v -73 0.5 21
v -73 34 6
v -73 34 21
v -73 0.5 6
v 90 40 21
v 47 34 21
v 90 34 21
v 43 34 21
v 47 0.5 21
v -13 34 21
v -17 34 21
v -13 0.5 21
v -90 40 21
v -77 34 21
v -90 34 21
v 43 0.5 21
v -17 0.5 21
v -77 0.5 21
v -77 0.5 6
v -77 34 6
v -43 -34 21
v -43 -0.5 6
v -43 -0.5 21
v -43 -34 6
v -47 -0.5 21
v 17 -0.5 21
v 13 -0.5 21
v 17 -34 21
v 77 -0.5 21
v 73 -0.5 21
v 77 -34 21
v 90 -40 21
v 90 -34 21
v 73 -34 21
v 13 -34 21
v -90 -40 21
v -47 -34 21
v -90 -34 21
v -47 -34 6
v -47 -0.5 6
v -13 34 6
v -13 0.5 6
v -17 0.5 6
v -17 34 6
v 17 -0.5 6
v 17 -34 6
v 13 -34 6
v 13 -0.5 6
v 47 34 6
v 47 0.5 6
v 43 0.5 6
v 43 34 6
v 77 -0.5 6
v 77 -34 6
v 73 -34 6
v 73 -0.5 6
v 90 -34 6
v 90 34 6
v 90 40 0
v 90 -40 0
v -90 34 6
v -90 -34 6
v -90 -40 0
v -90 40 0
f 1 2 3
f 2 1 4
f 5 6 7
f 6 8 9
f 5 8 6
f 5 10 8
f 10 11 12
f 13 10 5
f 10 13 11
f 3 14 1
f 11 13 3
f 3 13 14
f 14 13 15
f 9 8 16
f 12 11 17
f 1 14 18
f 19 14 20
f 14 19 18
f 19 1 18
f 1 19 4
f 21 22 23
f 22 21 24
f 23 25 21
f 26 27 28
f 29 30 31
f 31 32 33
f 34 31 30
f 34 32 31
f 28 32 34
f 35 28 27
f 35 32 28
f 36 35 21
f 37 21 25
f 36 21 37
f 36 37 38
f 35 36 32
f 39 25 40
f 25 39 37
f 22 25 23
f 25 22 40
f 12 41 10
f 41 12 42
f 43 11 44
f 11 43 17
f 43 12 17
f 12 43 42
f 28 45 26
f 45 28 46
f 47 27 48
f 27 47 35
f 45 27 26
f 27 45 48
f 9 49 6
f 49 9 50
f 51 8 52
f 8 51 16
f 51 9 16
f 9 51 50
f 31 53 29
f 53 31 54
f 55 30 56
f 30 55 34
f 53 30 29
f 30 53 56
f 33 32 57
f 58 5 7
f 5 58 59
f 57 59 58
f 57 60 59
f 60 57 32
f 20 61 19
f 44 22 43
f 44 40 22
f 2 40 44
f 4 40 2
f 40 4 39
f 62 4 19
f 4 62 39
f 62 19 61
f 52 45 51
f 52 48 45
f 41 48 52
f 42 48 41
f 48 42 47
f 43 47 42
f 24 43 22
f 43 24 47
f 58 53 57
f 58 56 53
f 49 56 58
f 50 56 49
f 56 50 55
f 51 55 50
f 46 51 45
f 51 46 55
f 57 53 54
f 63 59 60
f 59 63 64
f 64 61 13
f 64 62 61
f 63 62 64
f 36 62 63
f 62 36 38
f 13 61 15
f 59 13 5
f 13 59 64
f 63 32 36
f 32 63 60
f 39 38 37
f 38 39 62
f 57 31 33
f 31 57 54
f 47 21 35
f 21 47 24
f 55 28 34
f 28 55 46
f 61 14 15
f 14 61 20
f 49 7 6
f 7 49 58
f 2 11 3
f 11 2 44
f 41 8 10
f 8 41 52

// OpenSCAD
$fn = 32;

// ----------------------------------------------------------------------
// Rib frame 180 x 80 x 21
// 6 ribs at 30 mm pitch, staggered
// ----------------------------------------------------------------------

// --- parameters (mm) ---
frame = [180, 80, 6];  // base plate size (x, y, z)
rail_w = 6;            // side rail width
ribs = 6;              // number of ribs
rib_t = 4;             // rib thickness
rib_h = 15;            // rib height above the base plate
pitch = 30;            // pitch between rib centres

// --- derived feature positions (mm) ---
span = (ribs - 1) * pitch;          // = 150   distance between the outer ribs
origin_x = -span / 2;               // = -75   X of the first rib
rib_len = frame[1] / 2 - rail_w + 0.5;  // = 34.5   length of a staggered rib
rib_y = 0.5 + rib_len / 2;          // = 17.75   Y of a staggered rib centre
row_offset = 2 * rib_y;             // = 35.5   distance between the two rows
feature_centers = [
  [origin_x + 0 * pitch, rib_y],
  [origin_x + 1 * pitch, -rib_y],
  [origin_x + 2 * pitch, rib_y],
  [origin_x + 3 * pitch, -rib_y],
  [origin_x + 4 * pitch, rib_y],
  [origin_x + 5 * pitch, -rib_y]
];   // rib centre line, drives the rib loop

// base plate, two side rails, then the ribs read straight off feature_centers
union() {
  translate([-frame[0] / 2, -frame[1] / 2, 0]) cube(frame);
  translate([-frame[0] / 2, -frame[1] / 2, 0]) cube([frame[0], rail_w, frame[2] + rib_h]);
  translate([-frame[0] / 2, frame[1] / 2 - rail_w, 0]) cube([frame[0], rail_w, frame[2] + rib_h]);
  for (centre = feature_centers)
    translate([centre[0] - rib_t / 2, centre[1] - rib_len / 2, frame[2] - 1])
      cube([rib_t, rib_len, rib_h + 1]);
}
